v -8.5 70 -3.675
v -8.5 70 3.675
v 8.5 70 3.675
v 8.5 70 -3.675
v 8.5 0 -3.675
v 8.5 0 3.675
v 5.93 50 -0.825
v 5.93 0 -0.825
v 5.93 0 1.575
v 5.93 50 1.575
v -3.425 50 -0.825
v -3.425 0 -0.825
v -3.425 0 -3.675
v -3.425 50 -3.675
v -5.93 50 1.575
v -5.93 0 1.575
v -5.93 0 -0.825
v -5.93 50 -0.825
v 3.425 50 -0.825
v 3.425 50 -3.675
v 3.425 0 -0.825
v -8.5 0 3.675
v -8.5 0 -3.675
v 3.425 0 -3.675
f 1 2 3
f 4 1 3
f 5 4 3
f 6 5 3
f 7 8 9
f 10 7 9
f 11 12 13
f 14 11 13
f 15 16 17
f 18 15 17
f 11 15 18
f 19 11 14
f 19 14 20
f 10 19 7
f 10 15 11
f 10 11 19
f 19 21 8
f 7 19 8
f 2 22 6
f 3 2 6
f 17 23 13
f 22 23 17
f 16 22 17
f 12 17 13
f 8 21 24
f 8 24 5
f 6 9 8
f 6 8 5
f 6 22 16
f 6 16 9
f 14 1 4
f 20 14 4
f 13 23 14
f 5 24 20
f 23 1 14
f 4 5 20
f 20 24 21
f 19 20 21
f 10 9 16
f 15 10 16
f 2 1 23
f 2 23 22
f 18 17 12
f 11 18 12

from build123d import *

# Parameters (mm, degrees)
F0_W     = 17
F0_H     = 7.35
F1_DEPTH = 70
F3_DEPTH = 50


with BuildPart() as f1:
    # F0 (on Front) → F1 (new body)
    with BuildSketch(Plane.XZ):
        Rectangle(F0_W, F0_H)
    extrude(amount=-F1_DEPTH)

    # F2 (on face) → F3 (cut)
    with BuildSketch(Plane.XZ):
        Polygon((-3.425, -0.825), (-3.425, -3.675), (3.425, -3.675), (3.425, -0.825), (5.93029, -0.825), (5.93029, 1.575), (-5.93029, 1.575), (-5.93029, -0.825), align=None)
    extrude(amount=-F3_DEPTH, mode=Mode.SUBTRACT)


solid = f1.part
